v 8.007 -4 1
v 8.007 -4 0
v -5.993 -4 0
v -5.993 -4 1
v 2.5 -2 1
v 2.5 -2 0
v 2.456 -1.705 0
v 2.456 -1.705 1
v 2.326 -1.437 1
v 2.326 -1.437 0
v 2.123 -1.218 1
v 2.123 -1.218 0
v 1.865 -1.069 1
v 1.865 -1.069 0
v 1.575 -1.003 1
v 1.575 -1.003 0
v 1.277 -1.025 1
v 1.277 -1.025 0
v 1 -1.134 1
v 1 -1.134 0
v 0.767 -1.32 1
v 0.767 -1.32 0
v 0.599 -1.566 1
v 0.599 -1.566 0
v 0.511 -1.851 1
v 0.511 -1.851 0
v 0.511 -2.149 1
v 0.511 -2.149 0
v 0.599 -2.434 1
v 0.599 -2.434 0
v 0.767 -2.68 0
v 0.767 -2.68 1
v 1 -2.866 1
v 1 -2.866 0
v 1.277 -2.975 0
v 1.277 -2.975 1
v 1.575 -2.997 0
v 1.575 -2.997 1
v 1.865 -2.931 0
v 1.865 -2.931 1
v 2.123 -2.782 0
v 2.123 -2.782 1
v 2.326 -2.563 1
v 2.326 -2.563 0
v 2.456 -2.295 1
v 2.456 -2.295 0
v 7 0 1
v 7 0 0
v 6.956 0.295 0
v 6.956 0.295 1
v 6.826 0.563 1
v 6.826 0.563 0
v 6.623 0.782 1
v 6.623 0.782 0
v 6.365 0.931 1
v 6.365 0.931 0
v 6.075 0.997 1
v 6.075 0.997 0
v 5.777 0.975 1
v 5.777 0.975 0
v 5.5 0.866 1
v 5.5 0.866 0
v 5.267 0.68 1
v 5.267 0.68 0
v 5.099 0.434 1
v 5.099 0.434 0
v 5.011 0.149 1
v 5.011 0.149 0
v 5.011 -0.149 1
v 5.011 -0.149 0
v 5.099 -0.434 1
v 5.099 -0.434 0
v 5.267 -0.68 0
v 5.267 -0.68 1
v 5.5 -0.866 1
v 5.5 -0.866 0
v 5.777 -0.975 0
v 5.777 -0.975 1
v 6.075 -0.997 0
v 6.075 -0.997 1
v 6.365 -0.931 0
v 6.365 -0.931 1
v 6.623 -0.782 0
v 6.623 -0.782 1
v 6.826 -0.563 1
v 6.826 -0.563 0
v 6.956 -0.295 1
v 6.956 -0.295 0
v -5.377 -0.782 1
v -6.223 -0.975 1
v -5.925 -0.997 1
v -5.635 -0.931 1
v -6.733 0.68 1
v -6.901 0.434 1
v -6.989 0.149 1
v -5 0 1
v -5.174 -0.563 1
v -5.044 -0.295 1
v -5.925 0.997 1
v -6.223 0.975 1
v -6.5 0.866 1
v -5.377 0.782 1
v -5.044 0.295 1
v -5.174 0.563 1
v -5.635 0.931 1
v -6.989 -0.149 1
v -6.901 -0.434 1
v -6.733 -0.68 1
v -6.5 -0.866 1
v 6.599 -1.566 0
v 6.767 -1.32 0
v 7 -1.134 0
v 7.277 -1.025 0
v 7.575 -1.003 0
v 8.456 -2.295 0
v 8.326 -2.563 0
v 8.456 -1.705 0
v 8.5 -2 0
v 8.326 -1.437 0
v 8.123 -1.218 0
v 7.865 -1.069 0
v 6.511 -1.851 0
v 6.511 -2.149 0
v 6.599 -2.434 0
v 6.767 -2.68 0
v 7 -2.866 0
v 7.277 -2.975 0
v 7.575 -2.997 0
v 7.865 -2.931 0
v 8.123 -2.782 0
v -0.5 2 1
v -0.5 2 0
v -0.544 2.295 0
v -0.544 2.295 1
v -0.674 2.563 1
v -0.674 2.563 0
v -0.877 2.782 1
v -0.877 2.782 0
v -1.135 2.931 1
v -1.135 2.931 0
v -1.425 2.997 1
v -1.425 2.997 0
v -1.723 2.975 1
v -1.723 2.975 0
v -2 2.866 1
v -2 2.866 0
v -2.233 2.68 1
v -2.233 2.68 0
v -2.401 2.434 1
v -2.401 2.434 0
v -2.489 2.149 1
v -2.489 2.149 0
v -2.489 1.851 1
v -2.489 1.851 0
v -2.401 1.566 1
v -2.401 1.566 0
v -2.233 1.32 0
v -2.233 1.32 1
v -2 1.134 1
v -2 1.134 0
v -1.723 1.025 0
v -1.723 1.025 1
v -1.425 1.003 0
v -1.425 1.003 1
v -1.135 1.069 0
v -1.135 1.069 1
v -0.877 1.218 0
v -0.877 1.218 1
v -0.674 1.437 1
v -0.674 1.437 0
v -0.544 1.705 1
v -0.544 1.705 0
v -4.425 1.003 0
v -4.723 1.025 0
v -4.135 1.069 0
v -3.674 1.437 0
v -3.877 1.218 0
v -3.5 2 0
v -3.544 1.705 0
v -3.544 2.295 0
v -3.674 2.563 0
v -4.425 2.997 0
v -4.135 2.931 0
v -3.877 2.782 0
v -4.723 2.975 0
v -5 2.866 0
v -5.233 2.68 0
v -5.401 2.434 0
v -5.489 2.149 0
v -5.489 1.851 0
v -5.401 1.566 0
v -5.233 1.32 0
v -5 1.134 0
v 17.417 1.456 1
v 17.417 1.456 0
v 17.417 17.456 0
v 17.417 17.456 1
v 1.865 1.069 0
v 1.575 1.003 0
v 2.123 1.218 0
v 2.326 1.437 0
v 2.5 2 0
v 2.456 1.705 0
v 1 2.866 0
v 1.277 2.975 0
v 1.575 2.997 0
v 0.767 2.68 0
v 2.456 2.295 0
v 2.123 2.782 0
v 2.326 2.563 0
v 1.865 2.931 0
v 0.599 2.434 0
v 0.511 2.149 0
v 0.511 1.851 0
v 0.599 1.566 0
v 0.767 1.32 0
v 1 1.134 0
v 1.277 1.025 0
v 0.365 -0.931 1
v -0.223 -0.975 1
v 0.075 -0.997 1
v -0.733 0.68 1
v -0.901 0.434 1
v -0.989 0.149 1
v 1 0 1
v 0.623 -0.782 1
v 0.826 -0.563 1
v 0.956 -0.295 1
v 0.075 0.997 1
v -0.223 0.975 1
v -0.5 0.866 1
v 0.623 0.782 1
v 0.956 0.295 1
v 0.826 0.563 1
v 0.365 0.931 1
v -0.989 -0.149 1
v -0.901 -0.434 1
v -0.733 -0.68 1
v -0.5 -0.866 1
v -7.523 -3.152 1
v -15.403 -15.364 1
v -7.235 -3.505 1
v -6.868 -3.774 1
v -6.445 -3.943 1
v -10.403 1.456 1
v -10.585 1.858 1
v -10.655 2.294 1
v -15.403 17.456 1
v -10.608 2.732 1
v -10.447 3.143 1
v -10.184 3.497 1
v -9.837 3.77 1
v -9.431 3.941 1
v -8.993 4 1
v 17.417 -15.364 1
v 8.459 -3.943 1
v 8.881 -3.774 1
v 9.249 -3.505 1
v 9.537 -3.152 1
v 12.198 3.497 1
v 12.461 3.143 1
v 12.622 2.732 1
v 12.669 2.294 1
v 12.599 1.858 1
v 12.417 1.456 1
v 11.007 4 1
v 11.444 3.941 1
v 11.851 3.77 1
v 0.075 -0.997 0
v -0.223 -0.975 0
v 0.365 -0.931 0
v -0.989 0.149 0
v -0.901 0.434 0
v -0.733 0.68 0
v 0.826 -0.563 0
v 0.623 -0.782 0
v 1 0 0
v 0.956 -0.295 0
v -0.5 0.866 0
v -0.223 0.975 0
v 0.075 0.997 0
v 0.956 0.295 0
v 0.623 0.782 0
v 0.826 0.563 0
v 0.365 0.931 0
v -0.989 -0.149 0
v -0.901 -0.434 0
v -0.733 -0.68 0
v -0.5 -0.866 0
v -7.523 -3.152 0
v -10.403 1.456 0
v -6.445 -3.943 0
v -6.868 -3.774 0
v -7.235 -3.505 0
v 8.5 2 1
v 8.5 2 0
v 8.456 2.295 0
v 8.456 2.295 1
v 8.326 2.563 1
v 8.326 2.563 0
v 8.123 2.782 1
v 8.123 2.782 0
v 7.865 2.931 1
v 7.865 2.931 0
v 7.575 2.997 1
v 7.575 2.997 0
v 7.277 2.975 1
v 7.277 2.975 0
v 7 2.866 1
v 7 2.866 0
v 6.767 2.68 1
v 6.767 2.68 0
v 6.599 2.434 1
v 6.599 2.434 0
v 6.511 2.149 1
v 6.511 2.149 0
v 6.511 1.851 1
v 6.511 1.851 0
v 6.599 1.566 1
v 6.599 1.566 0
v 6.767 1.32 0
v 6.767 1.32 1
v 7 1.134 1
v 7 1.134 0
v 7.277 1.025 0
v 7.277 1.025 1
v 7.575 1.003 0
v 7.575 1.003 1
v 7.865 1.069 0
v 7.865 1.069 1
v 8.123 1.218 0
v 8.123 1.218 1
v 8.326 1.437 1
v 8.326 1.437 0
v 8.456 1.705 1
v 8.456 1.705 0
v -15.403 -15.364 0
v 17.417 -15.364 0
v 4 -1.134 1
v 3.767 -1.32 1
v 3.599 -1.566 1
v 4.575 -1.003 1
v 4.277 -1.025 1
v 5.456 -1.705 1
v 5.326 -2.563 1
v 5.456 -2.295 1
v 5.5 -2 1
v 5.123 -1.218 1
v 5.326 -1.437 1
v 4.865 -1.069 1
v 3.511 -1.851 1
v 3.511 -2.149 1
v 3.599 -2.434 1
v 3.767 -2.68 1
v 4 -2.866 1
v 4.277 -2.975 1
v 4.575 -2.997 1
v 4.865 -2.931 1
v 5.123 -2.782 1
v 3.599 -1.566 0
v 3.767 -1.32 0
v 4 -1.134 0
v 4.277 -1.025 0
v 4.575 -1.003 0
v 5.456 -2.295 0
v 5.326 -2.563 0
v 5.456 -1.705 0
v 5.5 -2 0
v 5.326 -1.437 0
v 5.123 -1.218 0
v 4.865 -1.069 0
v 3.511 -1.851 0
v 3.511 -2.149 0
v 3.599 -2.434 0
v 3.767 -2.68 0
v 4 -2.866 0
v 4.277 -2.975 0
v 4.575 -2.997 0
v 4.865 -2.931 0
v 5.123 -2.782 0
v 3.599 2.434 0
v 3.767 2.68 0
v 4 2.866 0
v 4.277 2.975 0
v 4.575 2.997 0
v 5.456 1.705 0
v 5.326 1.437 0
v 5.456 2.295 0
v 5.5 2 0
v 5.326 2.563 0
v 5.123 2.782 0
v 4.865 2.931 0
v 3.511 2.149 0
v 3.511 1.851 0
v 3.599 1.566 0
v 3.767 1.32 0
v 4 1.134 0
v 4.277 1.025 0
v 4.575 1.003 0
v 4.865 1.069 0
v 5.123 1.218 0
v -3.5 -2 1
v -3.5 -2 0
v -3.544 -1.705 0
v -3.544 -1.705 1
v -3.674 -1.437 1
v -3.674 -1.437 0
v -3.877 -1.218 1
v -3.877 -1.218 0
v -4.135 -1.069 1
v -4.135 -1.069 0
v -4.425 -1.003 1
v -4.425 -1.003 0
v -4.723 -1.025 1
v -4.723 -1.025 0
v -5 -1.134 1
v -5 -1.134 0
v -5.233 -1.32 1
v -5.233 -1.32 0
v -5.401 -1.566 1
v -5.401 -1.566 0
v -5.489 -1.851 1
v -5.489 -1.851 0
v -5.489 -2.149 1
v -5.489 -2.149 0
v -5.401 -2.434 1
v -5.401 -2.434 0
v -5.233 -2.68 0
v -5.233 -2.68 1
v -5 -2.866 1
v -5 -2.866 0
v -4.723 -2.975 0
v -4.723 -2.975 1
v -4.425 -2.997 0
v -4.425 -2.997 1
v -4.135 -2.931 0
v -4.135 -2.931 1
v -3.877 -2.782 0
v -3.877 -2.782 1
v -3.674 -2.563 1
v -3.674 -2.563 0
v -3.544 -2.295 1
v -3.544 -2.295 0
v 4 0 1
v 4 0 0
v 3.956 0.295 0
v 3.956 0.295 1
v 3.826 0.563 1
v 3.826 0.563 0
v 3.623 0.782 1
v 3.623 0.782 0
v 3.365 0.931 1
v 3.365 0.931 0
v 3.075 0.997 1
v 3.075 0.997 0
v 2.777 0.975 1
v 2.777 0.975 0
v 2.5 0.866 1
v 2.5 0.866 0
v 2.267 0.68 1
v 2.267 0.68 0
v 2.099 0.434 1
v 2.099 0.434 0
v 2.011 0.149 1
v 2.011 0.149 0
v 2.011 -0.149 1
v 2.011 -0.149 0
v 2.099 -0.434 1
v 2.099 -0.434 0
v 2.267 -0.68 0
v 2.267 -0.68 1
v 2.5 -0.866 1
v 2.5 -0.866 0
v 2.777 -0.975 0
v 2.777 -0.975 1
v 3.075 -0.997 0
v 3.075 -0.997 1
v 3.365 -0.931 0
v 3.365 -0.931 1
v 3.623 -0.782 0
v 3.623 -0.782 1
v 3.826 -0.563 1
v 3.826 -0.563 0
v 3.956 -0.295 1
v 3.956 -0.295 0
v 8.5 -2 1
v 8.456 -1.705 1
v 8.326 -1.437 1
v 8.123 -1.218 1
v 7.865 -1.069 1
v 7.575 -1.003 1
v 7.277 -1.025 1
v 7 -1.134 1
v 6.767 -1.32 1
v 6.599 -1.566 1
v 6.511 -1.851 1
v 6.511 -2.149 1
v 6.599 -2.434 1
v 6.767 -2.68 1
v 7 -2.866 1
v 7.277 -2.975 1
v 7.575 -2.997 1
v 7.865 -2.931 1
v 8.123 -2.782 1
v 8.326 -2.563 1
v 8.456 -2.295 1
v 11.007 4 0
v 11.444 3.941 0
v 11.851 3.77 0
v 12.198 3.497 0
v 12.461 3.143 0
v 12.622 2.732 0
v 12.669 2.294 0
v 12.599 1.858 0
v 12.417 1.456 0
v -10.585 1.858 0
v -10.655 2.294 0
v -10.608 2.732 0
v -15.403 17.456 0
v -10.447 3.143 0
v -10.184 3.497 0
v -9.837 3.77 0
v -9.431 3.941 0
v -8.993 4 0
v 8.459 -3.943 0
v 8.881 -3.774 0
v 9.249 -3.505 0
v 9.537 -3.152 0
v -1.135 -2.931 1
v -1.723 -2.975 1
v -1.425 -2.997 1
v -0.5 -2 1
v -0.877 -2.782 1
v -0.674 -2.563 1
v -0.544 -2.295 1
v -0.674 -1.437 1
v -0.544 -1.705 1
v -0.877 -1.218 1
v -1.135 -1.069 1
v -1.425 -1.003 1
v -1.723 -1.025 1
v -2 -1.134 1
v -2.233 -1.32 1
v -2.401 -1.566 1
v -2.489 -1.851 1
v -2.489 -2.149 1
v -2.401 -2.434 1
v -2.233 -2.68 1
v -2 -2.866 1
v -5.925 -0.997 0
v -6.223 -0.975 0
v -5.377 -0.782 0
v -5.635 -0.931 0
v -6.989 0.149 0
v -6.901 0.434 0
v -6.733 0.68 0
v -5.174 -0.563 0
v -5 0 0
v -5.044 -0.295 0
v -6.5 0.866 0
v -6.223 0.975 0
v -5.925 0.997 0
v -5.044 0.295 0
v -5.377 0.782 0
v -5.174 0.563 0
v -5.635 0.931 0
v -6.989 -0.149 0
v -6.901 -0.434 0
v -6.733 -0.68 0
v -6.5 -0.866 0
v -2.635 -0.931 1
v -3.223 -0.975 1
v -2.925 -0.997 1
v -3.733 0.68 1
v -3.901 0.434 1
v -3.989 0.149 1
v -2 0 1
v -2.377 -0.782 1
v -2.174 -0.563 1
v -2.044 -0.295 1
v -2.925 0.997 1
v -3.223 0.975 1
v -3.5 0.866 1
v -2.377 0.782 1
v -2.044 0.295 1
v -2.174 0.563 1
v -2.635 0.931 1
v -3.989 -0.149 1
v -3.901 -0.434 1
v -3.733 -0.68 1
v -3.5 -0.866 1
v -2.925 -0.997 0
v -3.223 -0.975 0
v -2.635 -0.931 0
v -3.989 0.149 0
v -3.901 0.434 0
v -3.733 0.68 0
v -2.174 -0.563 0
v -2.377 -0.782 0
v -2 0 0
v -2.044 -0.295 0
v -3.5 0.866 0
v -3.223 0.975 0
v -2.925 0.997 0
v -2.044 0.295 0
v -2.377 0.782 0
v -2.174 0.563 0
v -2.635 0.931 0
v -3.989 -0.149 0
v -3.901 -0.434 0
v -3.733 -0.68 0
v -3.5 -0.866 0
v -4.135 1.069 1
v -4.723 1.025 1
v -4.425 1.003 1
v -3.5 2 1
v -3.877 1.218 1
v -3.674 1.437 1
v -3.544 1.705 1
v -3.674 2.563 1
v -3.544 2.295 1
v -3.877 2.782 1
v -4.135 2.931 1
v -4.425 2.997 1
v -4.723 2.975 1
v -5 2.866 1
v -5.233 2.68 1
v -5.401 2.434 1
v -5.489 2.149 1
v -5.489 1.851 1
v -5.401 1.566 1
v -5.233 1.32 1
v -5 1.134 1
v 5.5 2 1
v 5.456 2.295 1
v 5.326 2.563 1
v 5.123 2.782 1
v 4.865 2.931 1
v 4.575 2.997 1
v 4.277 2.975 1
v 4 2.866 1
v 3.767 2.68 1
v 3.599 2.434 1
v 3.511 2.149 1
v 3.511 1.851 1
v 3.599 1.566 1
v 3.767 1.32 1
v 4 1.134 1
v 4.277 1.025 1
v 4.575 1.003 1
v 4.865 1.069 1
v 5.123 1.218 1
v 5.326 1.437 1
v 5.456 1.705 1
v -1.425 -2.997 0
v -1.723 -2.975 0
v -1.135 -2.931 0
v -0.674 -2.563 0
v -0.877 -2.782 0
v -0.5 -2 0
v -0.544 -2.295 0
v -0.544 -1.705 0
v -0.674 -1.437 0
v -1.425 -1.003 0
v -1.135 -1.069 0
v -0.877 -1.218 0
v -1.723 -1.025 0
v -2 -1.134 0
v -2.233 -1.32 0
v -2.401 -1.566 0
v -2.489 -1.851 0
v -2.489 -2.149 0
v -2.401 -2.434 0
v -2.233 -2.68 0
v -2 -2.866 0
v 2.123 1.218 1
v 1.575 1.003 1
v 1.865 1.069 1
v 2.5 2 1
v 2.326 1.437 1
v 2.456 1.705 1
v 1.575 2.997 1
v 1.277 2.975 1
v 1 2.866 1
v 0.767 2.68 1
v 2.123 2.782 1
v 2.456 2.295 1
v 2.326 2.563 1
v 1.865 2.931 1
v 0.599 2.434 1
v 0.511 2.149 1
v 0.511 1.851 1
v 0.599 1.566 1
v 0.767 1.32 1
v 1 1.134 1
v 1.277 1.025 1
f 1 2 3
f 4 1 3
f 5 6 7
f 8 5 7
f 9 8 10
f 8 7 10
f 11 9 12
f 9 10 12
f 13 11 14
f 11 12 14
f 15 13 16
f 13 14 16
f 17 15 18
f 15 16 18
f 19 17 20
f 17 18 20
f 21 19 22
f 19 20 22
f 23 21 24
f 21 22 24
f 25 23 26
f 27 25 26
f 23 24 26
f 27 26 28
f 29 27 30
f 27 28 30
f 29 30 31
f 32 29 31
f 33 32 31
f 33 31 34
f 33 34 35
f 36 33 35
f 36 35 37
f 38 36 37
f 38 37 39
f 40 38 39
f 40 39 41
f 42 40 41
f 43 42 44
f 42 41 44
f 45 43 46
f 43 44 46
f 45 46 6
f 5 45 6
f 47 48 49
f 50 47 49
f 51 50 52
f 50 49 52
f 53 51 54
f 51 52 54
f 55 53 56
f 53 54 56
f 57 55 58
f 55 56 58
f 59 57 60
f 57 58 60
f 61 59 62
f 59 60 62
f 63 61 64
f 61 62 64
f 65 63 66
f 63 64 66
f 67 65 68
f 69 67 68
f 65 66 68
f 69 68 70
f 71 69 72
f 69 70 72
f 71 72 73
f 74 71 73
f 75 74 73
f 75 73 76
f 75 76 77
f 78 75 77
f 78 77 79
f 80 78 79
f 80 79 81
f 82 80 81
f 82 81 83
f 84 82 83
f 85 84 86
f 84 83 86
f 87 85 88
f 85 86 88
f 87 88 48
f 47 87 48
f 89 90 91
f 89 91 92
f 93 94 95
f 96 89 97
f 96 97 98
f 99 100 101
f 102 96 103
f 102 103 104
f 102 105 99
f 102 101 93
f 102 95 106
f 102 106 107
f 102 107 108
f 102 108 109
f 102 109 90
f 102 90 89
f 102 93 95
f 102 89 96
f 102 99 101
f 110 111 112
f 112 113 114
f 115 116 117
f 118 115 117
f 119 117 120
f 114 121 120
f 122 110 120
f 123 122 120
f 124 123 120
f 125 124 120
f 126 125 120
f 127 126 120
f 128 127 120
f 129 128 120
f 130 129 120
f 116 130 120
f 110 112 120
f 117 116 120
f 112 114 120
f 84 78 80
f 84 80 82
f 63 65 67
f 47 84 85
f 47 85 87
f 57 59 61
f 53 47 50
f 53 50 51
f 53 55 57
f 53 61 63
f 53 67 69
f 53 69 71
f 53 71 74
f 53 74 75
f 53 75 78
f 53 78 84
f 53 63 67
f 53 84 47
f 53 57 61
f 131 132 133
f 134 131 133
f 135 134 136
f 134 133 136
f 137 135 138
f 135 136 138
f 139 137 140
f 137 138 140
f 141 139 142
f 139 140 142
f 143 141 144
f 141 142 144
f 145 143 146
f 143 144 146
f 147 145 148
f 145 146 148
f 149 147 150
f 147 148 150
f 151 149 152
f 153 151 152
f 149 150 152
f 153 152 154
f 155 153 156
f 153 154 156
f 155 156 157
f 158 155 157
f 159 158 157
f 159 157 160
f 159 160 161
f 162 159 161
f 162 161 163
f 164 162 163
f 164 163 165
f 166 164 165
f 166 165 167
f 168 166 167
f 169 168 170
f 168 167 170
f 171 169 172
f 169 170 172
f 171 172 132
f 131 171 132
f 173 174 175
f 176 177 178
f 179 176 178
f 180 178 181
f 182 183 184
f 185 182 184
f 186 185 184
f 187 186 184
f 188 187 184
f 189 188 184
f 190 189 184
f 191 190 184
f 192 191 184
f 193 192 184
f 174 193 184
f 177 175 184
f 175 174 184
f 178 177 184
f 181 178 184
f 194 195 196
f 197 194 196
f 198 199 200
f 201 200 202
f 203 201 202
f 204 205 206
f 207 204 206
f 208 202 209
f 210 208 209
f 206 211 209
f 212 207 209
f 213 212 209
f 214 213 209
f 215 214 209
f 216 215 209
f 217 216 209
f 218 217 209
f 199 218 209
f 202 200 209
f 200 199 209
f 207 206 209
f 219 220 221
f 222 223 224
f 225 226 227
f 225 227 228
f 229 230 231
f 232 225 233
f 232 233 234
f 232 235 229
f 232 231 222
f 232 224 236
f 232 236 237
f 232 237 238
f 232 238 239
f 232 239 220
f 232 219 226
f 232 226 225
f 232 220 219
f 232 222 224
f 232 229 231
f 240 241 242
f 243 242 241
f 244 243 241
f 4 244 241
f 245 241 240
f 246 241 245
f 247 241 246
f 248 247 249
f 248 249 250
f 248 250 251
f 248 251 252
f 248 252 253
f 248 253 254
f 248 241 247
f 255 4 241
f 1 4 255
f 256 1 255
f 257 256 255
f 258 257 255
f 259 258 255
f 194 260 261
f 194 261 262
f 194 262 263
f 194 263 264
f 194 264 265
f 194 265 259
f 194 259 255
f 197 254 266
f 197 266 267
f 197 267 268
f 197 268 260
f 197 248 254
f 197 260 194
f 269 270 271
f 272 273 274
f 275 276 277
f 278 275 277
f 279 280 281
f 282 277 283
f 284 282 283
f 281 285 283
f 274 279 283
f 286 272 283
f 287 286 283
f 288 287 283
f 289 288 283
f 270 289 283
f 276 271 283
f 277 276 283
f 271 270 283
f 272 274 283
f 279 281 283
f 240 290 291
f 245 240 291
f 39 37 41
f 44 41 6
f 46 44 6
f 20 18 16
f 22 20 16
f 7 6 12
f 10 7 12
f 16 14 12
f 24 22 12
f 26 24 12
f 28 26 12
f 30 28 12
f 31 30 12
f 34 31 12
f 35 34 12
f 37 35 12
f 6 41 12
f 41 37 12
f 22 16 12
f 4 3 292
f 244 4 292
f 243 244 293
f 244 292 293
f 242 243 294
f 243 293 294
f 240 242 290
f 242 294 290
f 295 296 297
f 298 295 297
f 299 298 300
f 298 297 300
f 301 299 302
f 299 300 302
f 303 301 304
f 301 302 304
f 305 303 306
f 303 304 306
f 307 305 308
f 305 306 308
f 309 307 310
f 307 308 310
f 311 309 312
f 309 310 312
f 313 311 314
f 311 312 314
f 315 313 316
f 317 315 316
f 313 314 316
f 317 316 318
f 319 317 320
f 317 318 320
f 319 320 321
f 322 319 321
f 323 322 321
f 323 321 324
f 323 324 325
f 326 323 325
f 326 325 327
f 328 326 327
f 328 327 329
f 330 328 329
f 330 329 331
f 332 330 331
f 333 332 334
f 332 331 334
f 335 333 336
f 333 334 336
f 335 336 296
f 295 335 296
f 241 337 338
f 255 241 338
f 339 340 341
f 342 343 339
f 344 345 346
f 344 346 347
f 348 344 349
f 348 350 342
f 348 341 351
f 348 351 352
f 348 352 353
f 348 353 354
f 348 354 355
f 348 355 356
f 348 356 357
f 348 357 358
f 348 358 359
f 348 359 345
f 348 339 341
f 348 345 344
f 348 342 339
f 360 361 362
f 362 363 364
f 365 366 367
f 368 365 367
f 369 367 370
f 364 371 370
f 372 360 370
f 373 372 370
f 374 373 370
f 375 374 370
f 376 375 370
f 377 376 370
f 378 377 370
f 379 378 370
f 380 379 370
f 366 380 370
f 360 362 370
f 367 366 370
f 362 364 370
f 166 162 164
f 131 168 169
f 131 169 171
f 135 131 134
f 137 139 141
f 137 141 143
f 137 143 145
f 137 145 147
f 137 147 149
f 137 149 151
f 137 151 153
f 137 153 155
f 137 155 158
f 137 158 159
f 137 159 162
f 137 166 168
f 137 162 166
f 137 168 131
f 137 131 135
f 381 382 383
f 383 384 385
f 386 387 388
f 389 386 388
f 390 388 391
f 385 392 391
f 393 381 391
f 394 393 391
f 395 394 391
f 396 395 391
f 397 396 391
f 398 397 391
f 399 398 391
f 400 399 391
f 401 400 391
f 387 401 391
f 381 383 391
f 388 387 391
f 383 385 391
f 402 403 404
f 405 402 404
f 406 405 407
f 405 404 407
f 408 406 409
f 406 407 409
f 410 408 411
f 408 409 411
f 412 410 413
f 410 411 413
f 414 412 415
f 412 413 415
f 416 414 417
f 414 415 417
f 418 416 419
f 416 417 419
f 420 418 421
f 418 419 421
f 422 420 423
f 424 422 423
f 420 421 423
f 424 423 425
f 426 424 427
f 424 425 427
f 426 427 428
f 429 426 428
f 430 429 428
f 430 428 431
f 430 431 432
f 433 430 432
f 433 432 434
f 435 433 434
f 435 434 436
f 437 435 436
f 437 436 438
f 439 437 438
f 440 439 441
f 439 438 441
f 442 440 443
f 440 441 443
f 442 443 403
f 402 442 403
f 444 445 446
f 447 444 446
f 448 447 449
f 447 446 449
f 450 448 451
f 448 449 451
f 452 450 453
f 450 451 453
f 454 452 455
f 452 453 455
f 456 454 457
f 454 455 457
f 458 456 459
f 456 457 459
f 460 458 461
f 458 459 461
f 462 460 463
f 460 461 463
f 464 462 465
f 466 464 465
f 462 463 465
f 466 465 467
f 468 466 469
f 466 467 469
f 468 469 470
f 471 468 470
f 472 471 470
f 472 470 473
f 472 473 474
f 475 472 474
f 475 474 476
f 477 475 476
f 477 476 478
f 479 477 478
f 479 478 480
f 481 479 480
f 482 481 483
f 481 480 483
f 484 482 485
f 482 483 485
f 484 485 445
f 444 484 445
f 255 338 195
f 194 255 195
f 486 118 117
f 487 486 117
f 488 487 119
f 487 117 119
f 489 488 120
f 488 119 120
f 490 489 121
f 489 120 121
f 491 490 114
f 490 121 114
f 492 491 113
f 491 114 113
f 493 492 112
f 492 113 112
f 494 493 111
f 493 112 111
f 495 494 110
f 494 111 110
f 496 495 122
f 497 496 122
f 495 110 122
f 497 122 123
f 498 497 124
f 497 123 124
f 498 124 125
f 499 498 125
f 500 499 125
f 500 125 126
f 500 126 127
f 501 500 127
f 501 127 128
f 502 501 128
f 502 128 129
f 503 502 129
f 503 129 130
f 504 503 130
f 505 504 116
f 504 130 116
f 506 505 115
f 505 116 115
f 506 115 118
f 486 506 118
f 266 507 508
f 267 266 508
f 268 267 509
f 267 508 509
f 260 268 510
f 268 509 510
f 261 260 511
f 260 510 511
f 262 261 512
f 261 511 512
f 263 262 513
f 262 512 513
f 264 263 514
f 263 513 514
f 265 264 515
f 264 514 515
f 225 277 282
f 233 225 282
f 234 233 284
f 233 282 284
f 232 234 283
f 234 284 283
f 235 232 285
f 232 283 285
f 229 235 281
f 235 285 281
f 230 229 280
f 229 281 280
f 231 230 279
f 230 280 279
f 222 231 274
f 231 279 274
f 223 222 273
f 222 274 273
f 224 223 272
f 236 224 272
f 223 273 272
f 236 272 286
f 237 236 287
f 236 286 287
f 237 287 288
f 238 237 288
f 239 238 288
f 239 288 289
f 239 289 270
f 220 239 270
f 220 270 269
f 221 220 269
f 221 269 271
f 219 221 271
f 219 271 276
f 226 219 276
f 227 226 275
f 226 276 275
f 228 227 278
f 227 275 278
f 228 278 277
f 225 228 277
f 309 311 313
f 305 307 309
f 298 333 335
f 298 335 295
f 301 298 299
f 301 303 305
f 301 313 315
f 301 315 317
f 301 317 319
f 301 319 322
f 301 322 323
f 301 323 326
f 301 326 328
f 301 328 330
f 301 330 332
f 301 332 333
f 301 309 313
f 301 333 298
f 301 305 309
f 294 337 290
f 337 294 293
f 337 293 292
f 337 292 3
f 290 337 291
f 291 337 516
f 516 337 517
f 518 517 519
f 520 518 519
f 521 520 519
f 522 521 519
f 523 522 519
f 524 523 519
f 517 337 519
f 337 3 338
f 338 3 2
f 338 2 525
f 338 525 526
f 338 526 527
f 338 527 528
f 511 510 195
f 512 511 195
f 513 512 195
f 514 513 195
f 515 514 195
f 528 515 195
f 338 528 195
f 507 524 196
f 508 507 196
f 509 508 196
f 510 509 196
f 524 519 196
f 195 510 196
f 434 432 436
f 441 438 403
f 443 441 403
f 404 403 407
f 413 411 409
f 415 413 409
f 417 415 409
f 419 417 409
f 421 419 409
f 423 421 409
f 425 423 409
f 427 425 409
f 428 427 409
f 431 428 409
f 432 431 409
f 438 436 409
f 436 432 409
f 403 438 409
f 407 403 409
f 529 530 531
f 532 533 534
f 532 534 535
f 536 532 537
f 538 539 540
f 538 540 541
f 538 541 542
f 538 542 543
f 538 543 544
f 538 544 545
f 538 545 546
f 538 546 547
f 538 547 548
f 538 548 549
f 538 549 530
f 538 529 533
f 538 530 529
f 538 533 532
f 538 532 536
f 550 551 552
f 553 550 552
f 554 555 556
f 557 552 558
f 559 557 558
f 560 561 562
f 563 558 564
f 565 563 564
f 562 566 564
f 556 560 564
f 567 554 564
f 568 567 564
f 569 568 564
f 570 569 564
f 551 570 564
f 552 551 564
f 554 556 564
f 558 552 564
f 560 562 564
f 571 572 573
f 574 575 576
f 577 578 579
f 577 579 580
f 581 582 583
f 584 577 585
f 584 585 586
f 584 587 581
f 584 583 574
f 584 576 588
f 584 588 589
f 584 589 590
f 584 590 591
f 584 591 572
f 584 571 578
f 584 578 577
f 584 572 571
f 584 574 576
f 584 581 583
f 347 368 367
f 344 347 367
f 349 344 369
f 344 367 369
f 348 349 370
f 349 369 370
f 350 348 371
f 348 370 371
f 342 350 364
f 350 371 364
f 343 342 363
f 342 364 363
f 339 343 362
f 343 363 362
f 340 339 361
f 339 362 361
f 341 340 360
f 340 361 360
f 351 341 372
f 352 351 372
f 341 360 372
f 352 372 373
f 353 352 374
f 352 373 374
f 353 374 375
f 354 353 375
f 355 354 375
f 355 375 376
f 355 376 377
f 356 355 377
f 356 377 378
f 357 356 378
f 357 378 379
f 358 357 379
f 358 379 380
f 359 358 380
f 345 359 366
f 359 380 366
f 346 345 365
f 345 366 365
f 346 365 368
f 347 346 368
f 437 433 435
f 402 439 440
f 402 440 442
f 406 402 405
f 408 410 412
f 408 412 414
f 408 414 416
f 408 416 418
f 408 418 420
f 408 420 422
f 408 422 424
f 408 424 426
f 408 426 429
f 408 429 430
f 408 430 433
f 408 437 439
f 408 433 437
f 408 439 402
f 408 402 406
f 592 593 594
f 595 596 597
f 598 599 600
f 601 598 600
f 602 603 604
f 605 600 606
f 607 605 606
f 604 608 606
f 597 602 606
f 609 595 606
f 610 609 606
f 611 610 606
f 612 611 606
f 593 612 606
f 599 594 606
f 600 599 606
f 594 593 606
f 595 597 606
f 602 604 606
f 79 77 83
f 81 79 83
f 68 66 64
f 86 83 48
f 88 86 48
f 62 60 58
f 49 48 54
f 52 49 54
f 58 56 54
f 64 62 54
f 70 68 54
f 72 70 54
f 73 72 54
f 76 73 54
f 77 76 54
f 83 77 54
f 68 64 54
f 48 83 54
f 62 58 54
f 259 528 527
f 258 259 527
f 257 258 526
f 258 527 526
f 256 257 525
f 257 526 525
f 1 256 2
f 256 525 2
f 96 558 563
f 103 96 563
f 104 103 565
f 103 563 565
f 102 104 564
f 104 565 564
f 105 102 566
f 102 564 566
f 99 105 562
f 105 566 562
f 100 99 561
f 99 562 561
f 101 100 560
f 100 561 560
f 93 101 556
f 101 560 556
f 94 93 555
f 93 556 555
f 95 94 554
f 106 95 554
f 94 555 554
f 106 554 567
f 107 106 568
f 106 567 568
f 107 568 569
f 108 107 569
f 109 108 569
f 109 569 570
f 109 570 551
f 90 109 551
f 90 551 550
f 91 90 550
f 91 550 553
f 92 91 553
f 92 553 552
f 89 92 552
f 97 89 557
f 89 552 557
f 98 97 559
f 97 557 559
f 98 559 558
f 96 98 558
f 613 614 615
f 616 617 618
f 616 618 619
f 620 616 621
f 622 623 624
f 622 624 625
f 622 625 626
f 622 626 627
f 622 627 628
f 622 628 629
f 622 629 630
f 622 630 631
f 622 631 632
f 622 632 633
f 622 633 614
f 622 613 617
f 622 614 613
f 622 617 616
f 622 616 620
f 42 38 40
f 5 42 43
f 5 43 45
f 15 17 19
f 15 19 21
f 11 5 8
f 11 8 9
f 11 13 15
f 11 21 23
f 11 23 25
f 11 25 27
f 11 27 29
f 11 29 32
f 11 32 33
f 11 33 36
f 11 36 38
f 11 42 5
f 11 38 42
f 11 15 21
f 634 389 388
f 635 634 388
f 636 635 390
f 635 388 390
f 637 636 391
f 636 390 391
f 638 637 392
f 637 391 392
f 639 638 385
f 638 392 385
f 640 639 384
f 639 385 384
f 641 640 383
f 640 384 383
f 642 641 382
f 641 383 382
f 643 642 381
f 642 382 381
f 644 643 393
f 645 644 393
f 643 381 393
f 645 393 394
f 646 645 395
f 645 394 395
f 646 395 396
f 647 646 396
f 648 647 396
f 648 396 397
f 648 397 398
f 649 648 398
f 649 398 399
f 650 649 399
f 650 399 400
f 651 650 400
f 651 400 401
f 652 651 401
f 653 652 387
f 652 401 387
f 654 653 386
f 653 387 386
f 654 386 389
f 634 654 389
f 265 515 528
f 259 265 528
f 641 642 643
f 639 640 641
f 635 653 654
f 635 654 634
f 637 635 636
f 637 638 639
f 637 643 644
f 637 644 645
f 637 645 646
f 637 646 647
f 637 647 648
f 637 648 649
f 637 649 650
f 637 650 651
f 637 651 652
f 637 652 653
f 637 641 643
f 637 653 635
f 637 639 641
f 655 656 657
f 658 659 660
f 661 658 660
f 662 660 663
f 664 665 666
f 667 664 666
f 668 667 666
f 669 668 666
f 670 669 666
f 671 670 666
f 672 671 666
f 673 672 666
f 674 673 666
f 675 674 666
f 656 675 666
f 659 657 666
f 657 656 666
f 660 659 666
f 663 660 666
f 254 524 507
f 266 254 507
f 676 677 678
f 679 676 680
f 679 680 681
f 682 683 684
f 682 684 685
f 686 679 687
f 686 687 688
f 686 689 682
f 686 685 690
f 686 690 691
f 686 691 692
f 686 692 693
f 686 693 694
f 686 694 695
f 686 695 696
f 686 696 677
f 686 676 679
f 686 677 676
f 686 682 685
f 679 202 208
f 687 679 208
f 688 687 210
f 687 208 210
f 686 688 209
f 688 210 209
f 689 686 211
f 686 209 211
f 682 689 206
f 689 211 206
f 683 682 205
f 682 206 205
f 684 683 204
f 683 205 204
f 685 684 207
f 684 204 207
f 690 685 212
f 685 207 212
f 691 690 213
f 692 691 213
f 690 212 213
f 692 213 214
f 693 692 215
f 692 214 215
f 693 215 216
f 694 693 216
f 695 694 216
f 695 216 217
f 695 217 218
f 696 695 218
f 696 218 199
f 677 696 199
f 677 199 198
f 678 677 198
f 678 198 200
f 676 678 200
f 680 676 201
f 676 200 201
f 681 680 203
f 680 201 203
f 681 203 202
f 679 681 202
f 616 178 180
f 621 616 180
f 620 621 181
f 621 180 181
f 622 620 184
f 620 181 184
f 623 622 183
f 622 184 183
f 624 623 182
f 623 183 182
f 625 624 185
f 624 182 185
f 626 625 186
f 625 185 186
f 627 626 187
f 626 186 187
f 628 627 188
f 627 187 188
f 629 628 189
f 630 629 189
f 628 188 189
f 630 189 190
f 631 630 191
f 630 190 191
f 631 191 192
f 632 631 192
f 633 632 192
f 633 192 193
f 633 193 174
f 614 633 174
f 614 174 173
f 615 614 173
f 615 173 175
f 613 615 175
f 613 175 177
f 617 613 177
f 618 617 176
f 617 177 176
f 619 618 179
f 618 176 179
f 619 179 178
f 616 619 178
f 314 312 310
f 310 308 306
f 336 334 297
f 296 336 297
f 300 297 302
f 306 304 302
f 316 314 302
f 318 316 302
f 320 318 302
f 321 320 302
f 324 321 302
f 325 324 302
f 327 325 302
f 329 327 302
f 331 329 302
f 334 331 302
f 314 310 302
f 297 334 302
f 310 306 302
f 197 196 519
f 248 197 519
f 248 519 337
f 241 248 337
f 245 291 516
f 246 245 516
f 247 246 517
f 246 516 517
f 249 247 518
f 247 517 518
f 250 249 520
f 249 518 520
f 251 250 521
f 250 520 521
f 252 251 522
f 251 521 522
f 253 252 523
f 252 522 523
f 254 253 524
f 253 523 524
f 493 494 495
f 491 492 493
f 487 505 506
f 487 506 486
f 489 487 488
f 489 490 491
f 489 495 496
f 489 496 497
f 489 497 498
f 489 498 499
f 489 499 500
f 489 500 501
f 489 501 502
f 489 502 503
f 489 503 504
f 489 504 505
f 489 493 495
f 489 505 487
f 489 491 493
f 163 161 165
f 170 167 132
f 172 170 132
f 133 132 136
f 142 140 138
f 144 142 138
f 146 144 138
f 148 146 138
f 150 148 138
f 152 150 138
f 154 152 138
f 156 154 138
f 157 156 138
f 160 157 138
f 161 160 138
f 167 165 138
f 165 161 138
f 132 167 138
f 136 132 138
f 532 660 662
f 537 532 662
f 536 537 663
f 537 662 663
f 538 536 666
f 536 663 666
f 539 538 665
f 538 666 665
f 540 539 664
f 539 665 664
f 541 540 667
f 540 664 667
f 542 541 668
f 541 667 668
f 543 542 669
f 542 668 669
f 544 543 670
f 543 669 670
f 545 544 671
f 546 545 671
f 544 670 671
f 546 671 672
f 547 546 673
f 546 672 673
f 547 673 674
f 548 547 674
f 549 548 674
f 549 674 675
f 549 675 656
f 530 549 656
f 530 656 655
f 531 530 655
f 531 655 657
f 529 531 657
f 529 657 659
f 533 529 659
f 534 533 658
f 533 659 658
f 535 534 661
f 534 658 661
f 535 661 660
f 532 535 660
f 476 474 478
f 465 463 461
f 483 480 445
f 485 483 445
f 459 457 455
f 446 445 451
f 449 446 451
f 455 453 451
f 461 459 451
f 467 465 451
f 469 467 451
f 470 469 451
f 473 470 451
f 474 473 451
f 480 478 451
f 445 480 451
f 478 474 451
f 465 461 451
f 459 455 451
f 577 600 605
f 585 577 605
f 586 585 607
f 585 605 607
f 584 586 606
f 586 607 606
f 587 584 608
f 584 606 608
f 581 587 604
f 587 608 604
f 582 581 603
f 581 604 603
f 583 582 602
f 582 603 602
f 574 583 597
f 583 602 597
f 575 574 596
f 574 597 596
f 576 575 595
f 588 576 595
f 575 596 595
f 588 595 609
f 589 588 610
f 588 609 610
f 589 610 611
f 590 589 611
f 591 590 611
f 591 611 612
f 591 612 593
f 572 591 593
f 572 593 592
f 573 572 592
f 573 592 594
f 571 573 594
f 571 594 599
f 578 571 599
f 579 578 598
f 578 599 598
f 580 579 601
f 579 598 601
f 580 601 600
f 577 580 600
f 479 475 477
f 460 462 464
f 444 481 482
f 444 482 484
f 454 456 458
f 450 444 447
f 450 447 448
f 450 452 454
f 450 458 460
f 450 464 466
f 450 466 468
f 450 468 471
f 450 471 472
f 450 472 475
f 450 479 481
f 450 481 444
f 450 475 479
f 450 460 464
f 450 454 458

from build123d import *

# Parameters (mm, degrees)
F0_R     = 1
F1_DEPTH = 1
F2_DEPTH = 1


# Not quite as in the source:
# - ends of sketch curves that miss each other by under 0.0002 mm in the source are joined


with BuildPart() as f1:
    # F0 (on Top) → F1 (new body)
    with BuildSketch(Plane.XY):
        with Locations((-4.5, 2)):
            Circle(F0_R)
    extrude(amount=F1_DEPTH)


with BuildPart() as f1b:
    # F0 (on Top) → F1, piece 2 (new body)
    with BuildSketch(Plane.XY):
        with Locations((-1.5, 2)):
            Circle(F0_R)
    extrude(amount=F1_DEPTH)


with BuildPart() as f1c:
    # F0 (on Top) → F1, piece 3 (new body)
    with BuildSketch(Plane.XY):
        with Locations((1.5, 2)):
            Circle(F0_R)
    extrude(amount=F1_DEPTH)


with BuildPart() as f1d:
    # F0 (on Top) → F1, piece 4 (new body)
    with BuildSketch(Plane.XY):
        with Locations((4.5, 2)):
            Circle(F0_R)
    extrude(amount=F1_DEPTH)


with BuildPart() as f1e:
    # F0 (on Top) → F1, piece 5 (new body)
    with BuildSketch(Plane.XY):
        with Locations((7.5, 2)):
            Circle(F0_R)
    extrude(amount=F1_DEPTH)


with BuildPart() as f1f:
    # F0 (on Top) → F1, piece 6 (new body)
    with BuildSketch(Plane.XY):
        with Locations((6, 0)):
            Circle(F0_R)
    extrude(amount=F1_DEPTH)


with BuildPart() as f1g:
    # F0 (on Top) → F1, piece 7 (new body)
    with BuildSketch(Plane.XY):
        with Locations((3, 0)):
            Circle(F0_R)
    extrude(amount=F1_DEPTH)


with BuildPart() as f1h:
    # F0 (on Top) → F1, piece 8 (new body)
    with BuildSketch(Plane.XY):
        Circle(F0_R)
    extrude(amount=F1_DEPTH)


with BuildPart() as f1i:
    # F0 (on Top) → F1, piece 9 (new body)
    with BuildSketch(Plane.XY):
        with Locations((-3, 0)):
            Circle(F0_R)
    extrude(amount=F1_DEPTH)


with BuildPart() as f1j:
    # F0 (on Top) → F1, piece 10 (new body)
    with BuildSketch(Plane.XY):
        with Locations((-6, 0)):
            Circle(F0_R)
    extrude(amount=F1_DEPTH)


with BuildPart() as f1k:
    # F0 (on Top) → F1, piece 11 (new body)
    with BuildSketch(Plane.XY):
        with Locations((-4.5, -2)):
            Circle(F0_R)
    extrude(amount=F1_DEPTH)


with BuildPart() as f1l:
    # F0 (on Top) → F1, piece 12 (new body)
    with BuildSketch(Plane.XY):
        with Locations((-1.5, -2)):
            Circle(F0_R)
    extrude(amount=F1_DEPTH)


with BuildPart() as f1m:
    # F0 (on Top) → F1, piece 13 (new body)
    with BuildSketch(Plane.XY):
        with Locations((1.5, -2)):
            Circle(F0_R)
    extrude(amount=F1_DEPTH)


with BuildPart() as f1n:
    # F0 (on Top) → F1, piece 14 (new body)
    with BuildSketch(Plane.XY):
        with Locations((4.5, -2)):
            Circle(F0_R)
    extrude(amount=F1_DEPTH)


with BuildPart() as f1o:
    # F0 (on Top) → F1, piece 15 (new body)
    with BuildSketch(Plane.XY):
        with Locations((7.5, -2)):
            Circle(F0_R)
    extrude(amount=F1_DEPTH)


with BuildPart() as f2:
    # F0 (on Top) → F2 (new body)
    with BuildSketch(Plane.XY):
        Polygon((17.4168121663, -15.363994912), (17.4168121663, 1.456005088), (17.4168185263, 17.456005088), (-15.4031878337, 17.456005088), (-15.4031878337, -15.363994912), align=None)
        with BuildLine():
            Line((-8.9931846537, 4), (0.0068153463, 4))
            Line((0.0068153463, 4), (11.0068153463, 4))
            ThreePointArc((11.0068153463, 4), (12.4611209434, 3.1433025227), (12.4168185263, 1.456005088))
            Line((12.4168185263, 1.456005088), (9.5368142863, -3.152001696))
            ThreePointArc((9.5368142863, -3.152001696), (8.8814578275, -3.7738239924), (8.0068153463, -4))
            Line((8.0068153463, -4), (-5.9931846537, -4))
            ThreePointArc((-5.9931846537, -4), (-6.867827135, -3.7738239924), (-7.5231835937, -3.152001696))
            Line((-7.5231835937, -3.152001696), (-10.4031878337, 1.456005088))
            ThreePointArc((-10.4031878337, 1.456005088), (-10.4474902509, 3.1433025227), (-8.9931846537, 4))
        make_face(mode=Mode.SUBTRACT)
    extrude(amount=F2_DEPTH)


solid = Compound([f1.part, f1b.part, f1c.part, f1d.part, f1e.part, f1f.part, f1g.part, f1h.part, f1i.part, f1j.part, f1k.part, f1l.part, f1m.part, f1n.part, f1o.part, f2.part])
